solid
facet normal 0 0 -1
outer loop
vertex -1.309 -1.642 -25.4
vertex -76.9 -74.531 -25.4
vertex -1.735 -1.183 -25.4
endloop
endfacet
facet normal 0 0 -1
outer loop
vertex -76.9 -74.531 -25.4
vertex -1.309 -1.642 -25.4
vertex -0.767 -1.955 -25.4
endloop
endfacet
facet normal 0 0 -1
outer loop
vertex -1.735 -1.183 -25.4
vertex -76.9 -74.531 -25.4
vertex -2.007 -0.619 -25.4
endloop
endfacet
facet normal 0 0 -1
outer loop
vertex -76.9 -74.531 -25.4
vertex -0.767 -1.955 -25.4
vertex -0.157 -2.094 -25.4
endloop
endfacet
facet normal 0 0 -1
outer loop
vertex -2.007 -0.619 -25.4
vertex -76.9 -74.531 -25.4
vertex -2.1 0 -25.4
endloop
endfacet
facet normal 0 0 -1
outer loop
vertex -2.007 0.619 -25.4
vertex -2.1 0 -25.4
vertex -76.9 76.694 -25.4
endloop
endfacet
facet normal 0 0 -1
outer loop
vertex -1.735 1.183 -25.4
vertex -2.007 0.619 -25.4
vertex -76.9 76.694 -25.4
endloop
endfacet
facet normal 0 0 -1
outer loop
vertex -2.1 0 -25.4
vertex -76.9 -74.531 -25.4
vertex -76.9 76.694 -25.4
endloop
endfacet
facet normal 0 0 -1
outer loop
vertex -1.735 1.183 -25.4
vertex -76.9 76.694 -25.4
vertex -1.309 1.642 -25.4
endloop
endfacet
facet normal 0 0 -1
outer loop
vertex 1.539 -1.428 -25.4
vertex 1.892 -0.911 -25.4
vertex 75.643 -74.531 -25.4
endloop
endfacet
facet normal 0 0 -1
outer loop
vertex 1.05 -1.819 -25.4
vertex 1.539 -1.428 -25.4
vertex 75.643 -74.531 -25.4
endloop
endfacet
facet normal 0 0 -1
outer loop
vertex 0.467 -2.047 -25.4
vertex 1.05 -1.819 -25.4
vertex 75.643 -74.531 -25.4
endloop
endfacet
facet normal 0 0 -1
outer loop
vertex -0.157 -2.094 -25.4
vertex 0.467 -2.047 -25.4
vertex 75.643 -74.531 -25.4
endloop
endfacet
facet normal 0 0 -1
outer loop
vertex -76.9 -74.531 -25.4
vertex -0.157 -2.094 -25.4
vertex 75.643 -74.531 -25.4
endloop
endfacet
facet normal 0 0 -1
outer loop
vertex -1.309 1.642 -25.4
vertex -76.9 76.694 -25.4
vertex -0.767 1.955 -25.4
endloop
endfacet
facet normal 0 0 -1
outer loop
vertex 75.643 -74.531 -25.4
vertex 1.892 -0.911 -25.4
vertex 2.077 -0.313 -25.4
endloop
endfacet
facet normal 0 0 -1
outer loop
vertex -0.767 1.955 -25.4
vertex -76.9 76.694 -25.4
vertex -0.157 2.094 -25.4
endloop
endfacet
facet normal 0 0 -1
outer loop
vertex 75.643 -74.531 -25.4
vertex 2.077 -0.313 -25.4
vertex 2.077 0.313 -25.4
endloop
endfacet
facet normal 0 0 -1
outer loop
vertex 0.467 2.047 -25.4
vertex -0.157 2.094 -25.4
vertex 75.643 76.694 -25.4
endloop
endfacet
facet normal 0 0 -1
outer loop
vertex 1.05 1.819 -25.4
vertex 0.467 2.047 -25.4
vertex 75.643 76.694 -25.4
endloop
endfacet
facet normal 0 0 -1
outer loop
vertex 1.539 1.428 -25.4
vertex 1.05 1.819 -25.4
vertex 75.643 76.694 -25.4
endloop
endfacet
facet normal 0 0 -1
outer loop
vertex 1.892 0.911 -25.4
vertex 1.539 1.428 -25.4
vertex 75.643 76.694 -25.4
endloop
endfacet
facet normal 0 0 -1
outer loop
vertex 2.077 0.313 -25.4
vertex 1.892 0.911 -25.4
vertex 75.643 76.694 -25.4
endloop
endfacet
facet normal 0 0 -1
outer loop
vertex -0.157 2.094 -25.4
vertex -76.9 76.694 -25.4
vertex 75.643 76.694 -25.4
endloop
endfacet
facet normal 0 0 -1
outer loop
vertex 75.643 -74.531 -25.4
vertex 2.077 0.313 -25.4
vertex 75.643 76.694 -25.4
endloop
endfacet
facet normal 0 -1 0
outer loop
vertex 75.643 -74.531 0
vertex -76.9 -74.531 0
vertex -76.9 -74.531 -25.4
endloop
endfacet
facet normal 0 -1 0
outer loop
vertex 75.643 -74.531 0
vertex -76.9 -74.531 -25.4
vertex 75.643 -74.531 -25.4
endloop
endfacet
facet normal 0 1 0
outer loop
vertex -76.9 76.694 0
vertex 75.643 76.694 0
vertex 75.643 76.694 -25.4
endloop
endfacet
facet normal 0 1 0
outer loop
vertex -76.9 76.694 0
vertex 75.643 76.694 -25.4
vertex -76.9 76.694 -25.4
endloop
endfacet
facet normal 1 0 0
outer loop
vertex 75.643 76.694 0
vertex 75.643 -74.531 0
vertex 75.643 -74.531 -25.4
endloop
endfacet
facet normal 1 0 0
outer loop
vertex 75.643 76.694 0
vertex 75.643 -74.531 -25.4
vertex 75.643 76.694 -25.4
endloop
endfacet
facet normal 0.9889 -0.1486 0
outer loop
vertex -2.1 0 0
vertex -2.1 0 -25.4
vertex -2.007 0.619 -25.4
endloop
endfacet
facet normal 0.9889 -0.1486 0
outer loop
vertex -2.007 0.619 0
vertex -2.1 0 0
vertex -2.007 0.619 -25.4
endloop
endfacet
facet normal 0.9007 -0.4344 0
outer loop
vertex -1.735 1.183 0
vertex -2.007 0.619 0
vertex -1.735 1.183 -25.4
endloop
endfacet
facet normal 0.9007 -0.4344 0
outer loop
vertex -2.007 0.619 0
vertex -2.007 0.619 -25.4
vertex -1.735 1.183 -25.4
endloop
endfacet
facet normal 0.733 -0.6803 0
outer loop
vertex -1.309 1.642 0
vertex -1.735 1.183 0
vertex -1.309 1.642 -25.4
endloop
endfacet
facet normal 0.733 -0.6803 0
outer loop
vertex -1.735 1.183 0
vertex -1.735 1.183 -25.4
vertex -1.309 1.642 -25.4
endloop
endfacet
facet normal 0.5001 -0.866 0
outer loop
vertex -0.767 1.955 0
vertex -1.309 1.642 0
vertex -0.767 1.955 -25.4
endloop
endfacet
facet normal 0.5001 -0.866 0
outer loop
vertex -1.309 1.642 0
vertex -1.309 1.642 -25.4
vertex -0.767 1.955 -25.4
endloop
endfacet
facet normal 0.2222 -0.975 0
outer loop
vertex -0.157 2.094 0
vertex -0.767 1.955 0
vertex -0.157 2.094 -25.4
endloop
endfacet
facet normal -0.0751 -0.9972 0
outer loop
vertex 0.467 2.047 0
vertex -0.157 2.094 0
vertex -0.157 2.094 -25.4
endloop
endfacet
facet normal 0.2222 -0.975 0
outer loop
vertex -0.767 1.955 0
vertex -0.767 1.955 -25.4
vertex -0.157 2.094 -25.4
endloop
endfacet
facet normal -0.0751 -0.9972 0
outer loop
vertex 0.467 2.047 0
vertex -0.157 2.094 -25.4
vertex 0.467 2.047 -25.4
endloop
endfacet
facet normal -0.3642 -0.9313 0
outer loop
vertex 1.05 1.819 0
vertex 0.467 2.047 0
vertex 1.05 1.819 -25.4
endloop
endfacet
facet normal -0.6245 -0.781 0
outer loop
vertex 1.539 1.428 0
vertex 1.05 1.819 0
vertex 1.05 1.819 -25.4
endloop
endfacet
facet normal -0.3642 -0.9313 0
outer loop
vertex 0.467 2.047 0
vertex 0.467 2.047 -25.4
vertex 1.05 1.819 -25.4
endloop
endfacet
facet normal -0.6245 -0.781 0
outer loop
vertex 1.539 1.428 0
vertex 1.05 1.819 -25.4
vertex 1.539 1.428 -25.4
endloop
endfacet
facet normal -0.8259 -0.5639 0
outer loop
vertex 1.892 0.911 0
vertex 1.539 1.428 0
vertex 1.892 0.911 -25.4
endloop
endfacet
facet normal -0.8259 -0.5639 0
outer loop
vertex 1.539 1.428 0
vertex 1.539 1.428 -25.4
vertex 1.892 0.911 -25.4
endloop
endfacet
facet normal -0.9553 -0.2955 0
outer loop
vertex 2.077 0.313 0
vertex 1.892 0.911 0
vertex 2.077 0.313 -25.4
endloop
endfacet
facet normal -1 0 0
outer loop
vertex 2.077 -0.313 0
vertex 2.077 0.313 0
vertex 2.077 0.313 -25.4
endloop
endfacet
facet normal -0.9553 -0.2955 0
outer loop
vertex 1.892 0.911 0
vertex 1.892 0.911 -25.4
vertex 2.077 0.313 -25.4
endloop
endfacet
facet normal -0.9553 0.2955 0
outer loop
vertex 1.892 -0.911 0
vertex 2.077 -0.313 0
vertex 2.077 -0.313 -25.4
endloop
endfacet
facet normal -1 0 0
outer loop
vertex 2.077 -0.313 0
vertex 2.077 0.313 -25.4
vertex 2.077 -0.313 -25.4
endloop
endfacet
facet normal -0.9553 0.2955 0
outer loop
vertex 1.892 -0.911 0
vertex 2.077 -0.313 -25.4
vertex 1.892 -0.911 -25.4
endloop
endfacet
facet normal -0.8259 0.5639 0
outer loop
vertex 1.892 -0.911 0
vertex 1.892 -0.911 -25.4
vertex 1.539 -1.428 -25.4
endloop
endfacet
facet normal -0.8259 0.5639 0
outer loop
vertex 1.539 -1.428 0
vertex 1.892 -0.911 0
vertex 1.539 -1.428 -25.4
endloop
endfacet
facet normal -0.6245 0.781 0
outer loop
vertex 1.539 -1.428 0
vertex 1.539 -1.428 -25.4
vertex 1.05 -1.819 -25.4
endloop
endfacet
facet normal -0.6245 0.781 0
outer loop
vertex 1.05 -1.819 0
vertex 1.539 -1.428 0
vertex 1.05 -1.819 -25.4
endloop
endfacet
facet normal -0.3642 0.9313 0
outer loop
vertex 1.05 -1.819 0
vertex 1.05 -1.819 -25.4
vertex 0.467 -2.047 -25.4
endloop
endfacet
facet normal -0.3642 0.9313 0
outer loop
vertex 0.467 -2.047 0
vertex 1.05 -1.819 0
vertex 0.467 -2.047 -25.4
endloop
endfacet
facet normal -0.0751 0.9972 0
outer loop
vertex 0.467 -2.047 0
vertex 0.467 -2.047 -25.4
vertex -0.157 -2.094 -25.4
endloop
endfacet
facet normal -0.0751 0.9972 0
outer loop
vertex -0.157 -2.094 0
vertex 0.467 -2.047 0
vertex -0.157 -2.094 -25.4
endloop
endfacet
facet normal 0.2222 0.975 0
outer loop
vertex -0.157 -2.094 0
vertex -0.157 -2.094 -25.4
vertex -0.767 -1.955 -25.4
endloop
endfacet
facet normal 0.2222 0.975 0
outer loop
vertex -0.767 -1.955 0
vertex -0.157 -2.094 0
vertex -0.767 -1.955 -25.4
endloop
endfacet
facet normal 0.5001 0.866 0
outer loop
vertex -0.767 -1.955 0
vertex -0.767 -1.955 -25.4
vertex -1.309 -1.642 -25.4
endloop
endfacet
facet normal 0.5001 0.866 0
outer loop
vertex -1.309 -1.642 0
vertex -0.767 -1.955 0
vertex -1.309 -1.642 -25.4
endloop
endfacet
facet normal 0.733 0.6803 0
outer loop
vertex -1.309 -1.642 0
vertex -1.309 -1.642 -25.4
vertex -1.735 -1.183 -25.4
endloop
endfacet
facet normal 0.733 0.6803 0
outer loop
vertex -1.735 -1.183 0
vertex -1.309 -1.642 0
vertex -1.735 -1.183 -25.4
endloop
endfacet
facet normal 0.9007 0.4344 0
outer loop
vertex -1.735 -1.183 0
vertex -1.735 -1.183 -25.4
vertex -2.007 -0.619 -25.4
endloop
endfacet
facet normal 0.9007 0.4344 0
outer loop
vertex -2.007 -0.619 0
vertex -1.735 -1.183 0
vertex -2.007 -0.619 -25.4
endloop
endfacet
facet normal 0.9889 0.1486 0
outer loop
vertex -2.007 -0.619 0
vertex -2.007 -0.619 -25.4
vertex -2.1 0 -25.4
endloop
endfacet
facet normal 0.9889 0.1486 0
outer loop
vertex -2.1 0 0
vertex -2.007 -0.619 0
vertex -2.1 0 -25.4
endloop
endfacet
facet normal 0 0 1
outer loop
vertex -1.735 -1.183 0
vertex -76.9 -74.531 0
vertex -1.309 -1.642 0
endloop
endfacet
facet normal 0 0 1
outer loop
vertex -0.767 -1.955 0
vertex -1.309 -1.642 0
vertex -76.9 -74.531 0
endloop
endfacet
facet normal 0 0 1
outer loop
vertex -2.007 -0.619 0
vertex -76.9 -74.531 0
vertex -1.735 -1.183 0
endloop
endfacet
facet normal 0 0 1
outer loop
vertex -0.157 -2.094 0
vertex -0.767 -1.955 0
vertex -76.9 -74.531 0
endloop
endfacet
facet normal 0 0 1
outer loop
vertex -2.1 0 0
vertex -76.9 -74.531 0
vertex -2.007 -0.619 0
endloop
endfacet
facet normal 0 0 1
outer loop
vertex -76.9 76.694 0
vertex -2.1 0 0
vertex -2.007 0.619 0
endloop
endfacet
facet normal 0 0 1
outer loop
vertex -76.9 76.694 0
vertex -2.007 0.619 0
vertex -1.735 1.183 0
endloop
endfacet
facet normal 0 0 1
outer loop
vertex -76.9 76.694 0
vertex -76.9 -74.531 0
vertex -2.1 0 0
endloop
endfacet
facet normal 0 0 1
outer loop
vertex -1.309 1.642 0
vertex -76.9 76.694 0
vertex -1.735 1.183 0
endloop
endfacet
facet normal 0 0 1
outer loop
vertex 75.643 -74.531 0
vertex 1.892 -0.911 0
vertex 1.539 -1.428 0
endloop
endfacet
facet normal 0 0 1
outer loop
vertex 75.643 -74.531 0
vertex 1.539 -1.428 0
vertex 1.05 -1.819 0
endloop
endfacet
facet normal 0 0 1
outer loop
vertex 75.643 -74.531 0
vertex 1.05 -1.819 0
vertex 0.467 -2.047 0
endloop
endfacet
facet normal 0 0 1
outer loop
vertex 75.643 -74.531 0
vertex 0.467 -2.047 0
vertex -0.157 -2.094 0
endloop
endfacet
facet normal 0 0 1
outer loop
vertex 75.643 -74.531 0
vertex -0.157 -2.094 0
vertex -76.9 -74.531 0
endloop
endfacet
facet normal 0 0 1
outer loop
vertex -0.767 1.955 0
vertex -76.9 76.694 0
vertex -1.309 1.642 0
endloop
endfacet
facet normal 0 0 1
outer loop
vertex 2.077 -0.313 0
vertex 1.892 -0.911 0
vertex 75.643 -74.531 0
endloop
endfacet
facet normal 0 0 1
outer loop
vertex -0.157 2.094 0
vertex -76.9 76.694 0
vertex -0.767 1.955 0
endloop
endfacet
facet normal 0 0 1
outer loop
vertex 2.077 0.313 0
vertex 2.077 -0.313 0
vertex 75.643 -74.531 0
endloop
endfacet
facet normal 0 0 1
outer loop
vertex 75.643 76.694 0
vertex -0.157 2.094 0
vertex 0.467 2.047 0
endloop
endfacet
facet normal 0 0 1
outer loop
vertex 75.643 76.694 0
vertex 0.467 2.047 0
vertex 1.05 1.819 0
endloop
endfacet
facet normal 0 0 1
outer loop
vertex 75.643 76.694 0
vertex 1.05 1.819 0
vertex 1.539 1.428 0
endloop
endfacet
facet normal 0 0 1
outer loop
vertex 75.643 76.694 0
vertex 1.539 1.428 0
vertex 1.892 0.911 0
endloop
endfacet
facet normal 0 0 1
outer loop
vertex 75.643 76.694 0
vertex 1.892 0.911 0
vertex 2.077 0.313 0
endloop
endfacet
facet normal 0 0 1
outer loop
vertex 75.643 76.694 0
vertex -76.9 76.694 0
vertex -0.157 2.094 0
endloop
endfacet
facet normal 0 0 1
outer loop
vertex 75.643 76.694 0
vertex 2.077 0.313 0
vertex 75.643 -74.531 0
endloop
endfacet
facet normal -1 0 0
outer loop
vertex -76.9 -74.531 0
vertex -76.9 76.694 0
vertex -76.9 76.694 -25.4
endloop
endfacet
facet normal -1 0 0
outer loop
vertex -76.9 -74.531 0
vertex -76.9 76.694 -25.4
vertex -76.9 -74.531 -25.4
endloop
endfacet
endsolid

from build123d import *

# Parameters (mm, degrees)
F1_DEPTH = 25.4
F3_D     = 4.2


with BuildPart() as f1:
    # F0 (on Top) → F1 (new body)
    with BuildSketch(Plane.XY):
        Polygon((75.6428092718, -74.5307654142), (75.6428092718, 0), (75.6428092718, 76.6944885254), (-76.9004449248, 76.6944885254), (-76.9004449248, -74.5307654142), align=None)
    extrude(amount=-F1_DEPTH)

    # F3 (through all)
    with Locations(Plane.XY):
        with Locations((0, 0)):
            Hole(F3_D / 2)


solid = f1.part
